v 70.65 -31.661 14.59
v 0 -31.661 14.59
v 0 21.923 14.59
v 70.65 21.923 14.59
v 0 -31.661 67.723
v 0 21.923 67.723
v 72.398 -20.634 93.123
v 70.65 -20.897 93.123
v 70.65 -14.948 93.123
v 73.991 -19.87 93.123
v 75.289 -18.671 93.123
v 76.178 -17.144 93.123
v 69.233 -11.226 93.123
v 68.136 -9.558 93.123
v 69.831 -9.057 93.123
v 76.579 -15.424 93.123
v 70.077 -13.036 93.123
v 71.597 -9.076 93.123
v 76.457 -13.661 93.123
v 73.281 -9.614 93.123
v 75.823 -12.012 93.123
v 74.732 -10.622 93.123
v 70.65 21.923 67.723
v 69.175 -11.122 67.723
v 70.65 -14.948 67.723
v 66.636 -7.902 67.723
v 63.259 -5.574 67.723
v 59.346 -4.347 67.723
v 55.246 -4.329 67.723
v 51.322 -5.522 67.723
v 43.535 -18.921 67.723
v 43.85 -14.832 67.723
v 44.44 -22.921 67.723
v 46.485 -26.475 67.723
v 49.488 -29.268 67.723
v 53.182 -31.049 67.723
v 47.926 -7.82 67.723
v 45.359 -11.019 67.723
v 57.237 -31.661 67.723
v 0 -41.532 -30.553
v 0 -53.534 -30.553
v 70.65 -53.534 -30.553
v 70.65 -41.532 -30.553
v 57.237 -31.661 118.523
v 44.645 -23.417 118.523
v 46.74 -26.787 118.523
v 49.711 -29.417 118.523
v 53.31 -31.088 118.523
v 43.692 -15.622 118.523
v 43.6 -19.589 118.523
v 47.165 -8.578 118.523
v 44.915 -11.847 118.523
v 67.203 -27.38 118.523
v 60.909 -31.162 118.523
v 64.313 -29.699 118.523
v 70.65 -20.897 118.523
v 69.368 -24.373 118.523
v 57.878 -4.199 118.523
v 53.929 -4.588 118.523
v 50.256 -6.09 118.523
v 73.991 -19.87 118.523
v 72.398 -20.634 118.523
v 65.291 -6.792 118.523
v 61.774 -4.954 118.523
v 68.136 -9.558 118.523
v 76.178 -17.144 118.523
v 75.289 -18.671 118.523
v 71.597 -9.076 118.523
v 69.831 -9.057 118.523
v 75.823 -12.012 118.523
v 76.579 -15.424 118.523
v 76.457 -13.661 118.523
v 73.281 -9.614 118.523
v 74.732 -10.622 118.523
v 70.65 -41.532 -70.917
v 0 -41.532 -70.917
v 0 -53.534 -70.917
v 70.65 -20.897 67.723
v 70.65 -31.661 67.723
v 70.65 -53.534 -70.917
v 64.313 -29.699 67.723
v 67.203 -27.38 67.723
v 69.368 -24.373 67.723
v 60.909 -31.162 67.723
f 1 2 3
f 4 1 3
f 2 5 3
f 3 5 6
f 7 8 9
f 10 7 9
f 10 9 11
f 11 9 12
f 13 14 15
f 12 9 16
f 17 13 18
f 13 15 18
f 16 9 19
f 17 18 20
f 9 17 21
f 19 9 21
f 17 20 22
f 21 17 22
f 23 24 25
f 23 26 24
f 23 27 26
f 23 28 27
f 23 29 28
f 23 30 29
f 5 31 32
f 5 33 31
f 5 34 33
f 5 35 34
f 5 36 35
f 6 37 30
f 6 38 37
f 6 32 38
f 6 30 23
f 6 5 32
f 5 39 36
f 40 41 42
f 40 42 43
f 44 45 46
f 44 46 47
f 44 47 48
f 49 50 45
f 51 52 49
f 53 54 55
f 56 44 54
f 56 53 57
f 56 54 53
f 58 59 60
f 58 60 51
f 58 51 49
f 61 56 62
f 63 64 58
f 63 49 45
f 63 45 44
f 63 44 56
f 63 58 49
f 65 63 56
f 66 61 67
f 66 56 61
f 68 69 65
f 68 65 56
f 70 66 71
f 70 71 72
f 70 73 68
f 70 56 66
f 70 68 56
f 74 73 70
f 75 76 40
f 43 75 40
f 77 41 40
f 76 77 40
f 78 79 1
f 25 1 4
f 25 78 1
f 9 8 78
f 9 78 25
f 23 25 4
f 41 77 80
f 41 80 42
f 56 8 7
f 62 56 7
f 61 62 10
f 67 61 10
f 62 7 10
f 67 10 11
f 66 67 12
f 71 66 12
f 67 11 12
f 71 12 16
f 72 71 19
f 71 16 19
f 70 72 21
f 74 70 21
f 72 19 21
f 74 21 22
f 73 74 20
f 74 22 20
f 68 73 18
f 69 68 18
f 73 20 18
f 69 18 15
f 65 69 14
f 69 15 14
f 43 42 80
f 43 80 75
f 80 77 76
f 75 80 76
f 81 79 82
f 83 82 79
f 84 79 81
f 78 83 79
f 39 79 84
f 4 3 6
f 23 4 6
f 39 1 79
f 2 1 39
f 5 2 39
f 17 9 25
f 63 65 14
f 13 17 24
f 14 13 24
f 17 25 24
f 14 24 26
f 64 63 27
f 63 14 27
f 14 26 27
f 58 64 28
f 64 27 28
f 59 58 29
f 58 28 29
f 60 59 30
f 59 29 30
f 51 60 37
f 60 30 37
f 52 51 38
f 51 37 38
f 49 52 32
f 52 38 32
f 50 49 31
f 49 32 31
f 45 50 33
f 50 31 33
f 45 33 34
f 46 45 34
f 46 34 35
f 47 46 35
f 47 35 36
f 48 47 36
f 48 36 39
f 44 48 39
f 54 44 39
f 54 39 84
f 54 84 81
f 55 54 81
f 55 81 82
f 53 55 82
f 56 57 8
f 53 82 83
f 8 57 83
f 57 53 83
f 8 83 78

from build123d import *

# Parameters (mm, degrees)
F3_W     = 12.0016336441
F3_H     = 40.3636842966
F0_DEPTH = 70.6501286477
F3_W_2   = 53.5843074322
F3_H_2   = 53.1327724457
F4_DEPTH = 25.4
F2_R     = 5.9481463901
F5_DEPTH = 25.4


with BuildPart() as f0:
    # F3 (on Right) → F0 (new body)
    with BuildSketch(Plane.YZ):
        with Locations((-47.5331246853, -50.7349595428)):
            Rectangle(F3_W, F3_H)
    extrude(amount=F0_DEPTH)


with BuildPart() as f0b:
    # F3 (on Right) → F0, piece 2 (new body)
    with BuildSketch(Plane.YZ):
        with Locations((-4.8692375422, 41.1562174559)):
            Rectangle(F3_W_2, F3_H_2)
    extrude(amount=F0_DEPTH)

    # F1 (on face) → F4 (join)
    with BuildSketch(Plane.XY.offset(67.7226036787)):
        with BuildLine():
            Line((70.6501286477, -20.8966161843), (70.6501286477, -14.9484697942))
            ThreePointArc((70.6501286477, -14.9484697942), (46.5221876519, -9.3232519897), (57.2370439768, -31.6613912582))
            ThreePointArc((57.2370439768, -31.6613912582), (65.8363349764, -28.6373993141), (70.6501286477, -20.8966161843))
        make_face()
    extrude(amount=F4_DEPTH)

    # F2 (on face) → F5 (join)
    with BuildSketch(Plane.XY.offset(93.1226036787)):
        with Locations((70.6501286477, -14.9484697942)):
            Circle(F2_R)
        with BuildLine():
            ThreePointArc((57.2370439768, -31.6613912582), (65.8363349764, -28.6373993141), (70.6501286477, -20.8966161843))
            ThreePointArc((70.6501286477, -20.8966161843), (64.8430195216, -16.2360757414), (68.1359779337, -9.5577841546))
            ThreePointArc((68.1359779337, -9.5577841546), (44.914744999, -11.8466151045), (57.2370439768, -31.6613912582))
        make_face()
    extrude(amount=F5_DEPTH)


solid = Compound([f0.part, f0b.part])
